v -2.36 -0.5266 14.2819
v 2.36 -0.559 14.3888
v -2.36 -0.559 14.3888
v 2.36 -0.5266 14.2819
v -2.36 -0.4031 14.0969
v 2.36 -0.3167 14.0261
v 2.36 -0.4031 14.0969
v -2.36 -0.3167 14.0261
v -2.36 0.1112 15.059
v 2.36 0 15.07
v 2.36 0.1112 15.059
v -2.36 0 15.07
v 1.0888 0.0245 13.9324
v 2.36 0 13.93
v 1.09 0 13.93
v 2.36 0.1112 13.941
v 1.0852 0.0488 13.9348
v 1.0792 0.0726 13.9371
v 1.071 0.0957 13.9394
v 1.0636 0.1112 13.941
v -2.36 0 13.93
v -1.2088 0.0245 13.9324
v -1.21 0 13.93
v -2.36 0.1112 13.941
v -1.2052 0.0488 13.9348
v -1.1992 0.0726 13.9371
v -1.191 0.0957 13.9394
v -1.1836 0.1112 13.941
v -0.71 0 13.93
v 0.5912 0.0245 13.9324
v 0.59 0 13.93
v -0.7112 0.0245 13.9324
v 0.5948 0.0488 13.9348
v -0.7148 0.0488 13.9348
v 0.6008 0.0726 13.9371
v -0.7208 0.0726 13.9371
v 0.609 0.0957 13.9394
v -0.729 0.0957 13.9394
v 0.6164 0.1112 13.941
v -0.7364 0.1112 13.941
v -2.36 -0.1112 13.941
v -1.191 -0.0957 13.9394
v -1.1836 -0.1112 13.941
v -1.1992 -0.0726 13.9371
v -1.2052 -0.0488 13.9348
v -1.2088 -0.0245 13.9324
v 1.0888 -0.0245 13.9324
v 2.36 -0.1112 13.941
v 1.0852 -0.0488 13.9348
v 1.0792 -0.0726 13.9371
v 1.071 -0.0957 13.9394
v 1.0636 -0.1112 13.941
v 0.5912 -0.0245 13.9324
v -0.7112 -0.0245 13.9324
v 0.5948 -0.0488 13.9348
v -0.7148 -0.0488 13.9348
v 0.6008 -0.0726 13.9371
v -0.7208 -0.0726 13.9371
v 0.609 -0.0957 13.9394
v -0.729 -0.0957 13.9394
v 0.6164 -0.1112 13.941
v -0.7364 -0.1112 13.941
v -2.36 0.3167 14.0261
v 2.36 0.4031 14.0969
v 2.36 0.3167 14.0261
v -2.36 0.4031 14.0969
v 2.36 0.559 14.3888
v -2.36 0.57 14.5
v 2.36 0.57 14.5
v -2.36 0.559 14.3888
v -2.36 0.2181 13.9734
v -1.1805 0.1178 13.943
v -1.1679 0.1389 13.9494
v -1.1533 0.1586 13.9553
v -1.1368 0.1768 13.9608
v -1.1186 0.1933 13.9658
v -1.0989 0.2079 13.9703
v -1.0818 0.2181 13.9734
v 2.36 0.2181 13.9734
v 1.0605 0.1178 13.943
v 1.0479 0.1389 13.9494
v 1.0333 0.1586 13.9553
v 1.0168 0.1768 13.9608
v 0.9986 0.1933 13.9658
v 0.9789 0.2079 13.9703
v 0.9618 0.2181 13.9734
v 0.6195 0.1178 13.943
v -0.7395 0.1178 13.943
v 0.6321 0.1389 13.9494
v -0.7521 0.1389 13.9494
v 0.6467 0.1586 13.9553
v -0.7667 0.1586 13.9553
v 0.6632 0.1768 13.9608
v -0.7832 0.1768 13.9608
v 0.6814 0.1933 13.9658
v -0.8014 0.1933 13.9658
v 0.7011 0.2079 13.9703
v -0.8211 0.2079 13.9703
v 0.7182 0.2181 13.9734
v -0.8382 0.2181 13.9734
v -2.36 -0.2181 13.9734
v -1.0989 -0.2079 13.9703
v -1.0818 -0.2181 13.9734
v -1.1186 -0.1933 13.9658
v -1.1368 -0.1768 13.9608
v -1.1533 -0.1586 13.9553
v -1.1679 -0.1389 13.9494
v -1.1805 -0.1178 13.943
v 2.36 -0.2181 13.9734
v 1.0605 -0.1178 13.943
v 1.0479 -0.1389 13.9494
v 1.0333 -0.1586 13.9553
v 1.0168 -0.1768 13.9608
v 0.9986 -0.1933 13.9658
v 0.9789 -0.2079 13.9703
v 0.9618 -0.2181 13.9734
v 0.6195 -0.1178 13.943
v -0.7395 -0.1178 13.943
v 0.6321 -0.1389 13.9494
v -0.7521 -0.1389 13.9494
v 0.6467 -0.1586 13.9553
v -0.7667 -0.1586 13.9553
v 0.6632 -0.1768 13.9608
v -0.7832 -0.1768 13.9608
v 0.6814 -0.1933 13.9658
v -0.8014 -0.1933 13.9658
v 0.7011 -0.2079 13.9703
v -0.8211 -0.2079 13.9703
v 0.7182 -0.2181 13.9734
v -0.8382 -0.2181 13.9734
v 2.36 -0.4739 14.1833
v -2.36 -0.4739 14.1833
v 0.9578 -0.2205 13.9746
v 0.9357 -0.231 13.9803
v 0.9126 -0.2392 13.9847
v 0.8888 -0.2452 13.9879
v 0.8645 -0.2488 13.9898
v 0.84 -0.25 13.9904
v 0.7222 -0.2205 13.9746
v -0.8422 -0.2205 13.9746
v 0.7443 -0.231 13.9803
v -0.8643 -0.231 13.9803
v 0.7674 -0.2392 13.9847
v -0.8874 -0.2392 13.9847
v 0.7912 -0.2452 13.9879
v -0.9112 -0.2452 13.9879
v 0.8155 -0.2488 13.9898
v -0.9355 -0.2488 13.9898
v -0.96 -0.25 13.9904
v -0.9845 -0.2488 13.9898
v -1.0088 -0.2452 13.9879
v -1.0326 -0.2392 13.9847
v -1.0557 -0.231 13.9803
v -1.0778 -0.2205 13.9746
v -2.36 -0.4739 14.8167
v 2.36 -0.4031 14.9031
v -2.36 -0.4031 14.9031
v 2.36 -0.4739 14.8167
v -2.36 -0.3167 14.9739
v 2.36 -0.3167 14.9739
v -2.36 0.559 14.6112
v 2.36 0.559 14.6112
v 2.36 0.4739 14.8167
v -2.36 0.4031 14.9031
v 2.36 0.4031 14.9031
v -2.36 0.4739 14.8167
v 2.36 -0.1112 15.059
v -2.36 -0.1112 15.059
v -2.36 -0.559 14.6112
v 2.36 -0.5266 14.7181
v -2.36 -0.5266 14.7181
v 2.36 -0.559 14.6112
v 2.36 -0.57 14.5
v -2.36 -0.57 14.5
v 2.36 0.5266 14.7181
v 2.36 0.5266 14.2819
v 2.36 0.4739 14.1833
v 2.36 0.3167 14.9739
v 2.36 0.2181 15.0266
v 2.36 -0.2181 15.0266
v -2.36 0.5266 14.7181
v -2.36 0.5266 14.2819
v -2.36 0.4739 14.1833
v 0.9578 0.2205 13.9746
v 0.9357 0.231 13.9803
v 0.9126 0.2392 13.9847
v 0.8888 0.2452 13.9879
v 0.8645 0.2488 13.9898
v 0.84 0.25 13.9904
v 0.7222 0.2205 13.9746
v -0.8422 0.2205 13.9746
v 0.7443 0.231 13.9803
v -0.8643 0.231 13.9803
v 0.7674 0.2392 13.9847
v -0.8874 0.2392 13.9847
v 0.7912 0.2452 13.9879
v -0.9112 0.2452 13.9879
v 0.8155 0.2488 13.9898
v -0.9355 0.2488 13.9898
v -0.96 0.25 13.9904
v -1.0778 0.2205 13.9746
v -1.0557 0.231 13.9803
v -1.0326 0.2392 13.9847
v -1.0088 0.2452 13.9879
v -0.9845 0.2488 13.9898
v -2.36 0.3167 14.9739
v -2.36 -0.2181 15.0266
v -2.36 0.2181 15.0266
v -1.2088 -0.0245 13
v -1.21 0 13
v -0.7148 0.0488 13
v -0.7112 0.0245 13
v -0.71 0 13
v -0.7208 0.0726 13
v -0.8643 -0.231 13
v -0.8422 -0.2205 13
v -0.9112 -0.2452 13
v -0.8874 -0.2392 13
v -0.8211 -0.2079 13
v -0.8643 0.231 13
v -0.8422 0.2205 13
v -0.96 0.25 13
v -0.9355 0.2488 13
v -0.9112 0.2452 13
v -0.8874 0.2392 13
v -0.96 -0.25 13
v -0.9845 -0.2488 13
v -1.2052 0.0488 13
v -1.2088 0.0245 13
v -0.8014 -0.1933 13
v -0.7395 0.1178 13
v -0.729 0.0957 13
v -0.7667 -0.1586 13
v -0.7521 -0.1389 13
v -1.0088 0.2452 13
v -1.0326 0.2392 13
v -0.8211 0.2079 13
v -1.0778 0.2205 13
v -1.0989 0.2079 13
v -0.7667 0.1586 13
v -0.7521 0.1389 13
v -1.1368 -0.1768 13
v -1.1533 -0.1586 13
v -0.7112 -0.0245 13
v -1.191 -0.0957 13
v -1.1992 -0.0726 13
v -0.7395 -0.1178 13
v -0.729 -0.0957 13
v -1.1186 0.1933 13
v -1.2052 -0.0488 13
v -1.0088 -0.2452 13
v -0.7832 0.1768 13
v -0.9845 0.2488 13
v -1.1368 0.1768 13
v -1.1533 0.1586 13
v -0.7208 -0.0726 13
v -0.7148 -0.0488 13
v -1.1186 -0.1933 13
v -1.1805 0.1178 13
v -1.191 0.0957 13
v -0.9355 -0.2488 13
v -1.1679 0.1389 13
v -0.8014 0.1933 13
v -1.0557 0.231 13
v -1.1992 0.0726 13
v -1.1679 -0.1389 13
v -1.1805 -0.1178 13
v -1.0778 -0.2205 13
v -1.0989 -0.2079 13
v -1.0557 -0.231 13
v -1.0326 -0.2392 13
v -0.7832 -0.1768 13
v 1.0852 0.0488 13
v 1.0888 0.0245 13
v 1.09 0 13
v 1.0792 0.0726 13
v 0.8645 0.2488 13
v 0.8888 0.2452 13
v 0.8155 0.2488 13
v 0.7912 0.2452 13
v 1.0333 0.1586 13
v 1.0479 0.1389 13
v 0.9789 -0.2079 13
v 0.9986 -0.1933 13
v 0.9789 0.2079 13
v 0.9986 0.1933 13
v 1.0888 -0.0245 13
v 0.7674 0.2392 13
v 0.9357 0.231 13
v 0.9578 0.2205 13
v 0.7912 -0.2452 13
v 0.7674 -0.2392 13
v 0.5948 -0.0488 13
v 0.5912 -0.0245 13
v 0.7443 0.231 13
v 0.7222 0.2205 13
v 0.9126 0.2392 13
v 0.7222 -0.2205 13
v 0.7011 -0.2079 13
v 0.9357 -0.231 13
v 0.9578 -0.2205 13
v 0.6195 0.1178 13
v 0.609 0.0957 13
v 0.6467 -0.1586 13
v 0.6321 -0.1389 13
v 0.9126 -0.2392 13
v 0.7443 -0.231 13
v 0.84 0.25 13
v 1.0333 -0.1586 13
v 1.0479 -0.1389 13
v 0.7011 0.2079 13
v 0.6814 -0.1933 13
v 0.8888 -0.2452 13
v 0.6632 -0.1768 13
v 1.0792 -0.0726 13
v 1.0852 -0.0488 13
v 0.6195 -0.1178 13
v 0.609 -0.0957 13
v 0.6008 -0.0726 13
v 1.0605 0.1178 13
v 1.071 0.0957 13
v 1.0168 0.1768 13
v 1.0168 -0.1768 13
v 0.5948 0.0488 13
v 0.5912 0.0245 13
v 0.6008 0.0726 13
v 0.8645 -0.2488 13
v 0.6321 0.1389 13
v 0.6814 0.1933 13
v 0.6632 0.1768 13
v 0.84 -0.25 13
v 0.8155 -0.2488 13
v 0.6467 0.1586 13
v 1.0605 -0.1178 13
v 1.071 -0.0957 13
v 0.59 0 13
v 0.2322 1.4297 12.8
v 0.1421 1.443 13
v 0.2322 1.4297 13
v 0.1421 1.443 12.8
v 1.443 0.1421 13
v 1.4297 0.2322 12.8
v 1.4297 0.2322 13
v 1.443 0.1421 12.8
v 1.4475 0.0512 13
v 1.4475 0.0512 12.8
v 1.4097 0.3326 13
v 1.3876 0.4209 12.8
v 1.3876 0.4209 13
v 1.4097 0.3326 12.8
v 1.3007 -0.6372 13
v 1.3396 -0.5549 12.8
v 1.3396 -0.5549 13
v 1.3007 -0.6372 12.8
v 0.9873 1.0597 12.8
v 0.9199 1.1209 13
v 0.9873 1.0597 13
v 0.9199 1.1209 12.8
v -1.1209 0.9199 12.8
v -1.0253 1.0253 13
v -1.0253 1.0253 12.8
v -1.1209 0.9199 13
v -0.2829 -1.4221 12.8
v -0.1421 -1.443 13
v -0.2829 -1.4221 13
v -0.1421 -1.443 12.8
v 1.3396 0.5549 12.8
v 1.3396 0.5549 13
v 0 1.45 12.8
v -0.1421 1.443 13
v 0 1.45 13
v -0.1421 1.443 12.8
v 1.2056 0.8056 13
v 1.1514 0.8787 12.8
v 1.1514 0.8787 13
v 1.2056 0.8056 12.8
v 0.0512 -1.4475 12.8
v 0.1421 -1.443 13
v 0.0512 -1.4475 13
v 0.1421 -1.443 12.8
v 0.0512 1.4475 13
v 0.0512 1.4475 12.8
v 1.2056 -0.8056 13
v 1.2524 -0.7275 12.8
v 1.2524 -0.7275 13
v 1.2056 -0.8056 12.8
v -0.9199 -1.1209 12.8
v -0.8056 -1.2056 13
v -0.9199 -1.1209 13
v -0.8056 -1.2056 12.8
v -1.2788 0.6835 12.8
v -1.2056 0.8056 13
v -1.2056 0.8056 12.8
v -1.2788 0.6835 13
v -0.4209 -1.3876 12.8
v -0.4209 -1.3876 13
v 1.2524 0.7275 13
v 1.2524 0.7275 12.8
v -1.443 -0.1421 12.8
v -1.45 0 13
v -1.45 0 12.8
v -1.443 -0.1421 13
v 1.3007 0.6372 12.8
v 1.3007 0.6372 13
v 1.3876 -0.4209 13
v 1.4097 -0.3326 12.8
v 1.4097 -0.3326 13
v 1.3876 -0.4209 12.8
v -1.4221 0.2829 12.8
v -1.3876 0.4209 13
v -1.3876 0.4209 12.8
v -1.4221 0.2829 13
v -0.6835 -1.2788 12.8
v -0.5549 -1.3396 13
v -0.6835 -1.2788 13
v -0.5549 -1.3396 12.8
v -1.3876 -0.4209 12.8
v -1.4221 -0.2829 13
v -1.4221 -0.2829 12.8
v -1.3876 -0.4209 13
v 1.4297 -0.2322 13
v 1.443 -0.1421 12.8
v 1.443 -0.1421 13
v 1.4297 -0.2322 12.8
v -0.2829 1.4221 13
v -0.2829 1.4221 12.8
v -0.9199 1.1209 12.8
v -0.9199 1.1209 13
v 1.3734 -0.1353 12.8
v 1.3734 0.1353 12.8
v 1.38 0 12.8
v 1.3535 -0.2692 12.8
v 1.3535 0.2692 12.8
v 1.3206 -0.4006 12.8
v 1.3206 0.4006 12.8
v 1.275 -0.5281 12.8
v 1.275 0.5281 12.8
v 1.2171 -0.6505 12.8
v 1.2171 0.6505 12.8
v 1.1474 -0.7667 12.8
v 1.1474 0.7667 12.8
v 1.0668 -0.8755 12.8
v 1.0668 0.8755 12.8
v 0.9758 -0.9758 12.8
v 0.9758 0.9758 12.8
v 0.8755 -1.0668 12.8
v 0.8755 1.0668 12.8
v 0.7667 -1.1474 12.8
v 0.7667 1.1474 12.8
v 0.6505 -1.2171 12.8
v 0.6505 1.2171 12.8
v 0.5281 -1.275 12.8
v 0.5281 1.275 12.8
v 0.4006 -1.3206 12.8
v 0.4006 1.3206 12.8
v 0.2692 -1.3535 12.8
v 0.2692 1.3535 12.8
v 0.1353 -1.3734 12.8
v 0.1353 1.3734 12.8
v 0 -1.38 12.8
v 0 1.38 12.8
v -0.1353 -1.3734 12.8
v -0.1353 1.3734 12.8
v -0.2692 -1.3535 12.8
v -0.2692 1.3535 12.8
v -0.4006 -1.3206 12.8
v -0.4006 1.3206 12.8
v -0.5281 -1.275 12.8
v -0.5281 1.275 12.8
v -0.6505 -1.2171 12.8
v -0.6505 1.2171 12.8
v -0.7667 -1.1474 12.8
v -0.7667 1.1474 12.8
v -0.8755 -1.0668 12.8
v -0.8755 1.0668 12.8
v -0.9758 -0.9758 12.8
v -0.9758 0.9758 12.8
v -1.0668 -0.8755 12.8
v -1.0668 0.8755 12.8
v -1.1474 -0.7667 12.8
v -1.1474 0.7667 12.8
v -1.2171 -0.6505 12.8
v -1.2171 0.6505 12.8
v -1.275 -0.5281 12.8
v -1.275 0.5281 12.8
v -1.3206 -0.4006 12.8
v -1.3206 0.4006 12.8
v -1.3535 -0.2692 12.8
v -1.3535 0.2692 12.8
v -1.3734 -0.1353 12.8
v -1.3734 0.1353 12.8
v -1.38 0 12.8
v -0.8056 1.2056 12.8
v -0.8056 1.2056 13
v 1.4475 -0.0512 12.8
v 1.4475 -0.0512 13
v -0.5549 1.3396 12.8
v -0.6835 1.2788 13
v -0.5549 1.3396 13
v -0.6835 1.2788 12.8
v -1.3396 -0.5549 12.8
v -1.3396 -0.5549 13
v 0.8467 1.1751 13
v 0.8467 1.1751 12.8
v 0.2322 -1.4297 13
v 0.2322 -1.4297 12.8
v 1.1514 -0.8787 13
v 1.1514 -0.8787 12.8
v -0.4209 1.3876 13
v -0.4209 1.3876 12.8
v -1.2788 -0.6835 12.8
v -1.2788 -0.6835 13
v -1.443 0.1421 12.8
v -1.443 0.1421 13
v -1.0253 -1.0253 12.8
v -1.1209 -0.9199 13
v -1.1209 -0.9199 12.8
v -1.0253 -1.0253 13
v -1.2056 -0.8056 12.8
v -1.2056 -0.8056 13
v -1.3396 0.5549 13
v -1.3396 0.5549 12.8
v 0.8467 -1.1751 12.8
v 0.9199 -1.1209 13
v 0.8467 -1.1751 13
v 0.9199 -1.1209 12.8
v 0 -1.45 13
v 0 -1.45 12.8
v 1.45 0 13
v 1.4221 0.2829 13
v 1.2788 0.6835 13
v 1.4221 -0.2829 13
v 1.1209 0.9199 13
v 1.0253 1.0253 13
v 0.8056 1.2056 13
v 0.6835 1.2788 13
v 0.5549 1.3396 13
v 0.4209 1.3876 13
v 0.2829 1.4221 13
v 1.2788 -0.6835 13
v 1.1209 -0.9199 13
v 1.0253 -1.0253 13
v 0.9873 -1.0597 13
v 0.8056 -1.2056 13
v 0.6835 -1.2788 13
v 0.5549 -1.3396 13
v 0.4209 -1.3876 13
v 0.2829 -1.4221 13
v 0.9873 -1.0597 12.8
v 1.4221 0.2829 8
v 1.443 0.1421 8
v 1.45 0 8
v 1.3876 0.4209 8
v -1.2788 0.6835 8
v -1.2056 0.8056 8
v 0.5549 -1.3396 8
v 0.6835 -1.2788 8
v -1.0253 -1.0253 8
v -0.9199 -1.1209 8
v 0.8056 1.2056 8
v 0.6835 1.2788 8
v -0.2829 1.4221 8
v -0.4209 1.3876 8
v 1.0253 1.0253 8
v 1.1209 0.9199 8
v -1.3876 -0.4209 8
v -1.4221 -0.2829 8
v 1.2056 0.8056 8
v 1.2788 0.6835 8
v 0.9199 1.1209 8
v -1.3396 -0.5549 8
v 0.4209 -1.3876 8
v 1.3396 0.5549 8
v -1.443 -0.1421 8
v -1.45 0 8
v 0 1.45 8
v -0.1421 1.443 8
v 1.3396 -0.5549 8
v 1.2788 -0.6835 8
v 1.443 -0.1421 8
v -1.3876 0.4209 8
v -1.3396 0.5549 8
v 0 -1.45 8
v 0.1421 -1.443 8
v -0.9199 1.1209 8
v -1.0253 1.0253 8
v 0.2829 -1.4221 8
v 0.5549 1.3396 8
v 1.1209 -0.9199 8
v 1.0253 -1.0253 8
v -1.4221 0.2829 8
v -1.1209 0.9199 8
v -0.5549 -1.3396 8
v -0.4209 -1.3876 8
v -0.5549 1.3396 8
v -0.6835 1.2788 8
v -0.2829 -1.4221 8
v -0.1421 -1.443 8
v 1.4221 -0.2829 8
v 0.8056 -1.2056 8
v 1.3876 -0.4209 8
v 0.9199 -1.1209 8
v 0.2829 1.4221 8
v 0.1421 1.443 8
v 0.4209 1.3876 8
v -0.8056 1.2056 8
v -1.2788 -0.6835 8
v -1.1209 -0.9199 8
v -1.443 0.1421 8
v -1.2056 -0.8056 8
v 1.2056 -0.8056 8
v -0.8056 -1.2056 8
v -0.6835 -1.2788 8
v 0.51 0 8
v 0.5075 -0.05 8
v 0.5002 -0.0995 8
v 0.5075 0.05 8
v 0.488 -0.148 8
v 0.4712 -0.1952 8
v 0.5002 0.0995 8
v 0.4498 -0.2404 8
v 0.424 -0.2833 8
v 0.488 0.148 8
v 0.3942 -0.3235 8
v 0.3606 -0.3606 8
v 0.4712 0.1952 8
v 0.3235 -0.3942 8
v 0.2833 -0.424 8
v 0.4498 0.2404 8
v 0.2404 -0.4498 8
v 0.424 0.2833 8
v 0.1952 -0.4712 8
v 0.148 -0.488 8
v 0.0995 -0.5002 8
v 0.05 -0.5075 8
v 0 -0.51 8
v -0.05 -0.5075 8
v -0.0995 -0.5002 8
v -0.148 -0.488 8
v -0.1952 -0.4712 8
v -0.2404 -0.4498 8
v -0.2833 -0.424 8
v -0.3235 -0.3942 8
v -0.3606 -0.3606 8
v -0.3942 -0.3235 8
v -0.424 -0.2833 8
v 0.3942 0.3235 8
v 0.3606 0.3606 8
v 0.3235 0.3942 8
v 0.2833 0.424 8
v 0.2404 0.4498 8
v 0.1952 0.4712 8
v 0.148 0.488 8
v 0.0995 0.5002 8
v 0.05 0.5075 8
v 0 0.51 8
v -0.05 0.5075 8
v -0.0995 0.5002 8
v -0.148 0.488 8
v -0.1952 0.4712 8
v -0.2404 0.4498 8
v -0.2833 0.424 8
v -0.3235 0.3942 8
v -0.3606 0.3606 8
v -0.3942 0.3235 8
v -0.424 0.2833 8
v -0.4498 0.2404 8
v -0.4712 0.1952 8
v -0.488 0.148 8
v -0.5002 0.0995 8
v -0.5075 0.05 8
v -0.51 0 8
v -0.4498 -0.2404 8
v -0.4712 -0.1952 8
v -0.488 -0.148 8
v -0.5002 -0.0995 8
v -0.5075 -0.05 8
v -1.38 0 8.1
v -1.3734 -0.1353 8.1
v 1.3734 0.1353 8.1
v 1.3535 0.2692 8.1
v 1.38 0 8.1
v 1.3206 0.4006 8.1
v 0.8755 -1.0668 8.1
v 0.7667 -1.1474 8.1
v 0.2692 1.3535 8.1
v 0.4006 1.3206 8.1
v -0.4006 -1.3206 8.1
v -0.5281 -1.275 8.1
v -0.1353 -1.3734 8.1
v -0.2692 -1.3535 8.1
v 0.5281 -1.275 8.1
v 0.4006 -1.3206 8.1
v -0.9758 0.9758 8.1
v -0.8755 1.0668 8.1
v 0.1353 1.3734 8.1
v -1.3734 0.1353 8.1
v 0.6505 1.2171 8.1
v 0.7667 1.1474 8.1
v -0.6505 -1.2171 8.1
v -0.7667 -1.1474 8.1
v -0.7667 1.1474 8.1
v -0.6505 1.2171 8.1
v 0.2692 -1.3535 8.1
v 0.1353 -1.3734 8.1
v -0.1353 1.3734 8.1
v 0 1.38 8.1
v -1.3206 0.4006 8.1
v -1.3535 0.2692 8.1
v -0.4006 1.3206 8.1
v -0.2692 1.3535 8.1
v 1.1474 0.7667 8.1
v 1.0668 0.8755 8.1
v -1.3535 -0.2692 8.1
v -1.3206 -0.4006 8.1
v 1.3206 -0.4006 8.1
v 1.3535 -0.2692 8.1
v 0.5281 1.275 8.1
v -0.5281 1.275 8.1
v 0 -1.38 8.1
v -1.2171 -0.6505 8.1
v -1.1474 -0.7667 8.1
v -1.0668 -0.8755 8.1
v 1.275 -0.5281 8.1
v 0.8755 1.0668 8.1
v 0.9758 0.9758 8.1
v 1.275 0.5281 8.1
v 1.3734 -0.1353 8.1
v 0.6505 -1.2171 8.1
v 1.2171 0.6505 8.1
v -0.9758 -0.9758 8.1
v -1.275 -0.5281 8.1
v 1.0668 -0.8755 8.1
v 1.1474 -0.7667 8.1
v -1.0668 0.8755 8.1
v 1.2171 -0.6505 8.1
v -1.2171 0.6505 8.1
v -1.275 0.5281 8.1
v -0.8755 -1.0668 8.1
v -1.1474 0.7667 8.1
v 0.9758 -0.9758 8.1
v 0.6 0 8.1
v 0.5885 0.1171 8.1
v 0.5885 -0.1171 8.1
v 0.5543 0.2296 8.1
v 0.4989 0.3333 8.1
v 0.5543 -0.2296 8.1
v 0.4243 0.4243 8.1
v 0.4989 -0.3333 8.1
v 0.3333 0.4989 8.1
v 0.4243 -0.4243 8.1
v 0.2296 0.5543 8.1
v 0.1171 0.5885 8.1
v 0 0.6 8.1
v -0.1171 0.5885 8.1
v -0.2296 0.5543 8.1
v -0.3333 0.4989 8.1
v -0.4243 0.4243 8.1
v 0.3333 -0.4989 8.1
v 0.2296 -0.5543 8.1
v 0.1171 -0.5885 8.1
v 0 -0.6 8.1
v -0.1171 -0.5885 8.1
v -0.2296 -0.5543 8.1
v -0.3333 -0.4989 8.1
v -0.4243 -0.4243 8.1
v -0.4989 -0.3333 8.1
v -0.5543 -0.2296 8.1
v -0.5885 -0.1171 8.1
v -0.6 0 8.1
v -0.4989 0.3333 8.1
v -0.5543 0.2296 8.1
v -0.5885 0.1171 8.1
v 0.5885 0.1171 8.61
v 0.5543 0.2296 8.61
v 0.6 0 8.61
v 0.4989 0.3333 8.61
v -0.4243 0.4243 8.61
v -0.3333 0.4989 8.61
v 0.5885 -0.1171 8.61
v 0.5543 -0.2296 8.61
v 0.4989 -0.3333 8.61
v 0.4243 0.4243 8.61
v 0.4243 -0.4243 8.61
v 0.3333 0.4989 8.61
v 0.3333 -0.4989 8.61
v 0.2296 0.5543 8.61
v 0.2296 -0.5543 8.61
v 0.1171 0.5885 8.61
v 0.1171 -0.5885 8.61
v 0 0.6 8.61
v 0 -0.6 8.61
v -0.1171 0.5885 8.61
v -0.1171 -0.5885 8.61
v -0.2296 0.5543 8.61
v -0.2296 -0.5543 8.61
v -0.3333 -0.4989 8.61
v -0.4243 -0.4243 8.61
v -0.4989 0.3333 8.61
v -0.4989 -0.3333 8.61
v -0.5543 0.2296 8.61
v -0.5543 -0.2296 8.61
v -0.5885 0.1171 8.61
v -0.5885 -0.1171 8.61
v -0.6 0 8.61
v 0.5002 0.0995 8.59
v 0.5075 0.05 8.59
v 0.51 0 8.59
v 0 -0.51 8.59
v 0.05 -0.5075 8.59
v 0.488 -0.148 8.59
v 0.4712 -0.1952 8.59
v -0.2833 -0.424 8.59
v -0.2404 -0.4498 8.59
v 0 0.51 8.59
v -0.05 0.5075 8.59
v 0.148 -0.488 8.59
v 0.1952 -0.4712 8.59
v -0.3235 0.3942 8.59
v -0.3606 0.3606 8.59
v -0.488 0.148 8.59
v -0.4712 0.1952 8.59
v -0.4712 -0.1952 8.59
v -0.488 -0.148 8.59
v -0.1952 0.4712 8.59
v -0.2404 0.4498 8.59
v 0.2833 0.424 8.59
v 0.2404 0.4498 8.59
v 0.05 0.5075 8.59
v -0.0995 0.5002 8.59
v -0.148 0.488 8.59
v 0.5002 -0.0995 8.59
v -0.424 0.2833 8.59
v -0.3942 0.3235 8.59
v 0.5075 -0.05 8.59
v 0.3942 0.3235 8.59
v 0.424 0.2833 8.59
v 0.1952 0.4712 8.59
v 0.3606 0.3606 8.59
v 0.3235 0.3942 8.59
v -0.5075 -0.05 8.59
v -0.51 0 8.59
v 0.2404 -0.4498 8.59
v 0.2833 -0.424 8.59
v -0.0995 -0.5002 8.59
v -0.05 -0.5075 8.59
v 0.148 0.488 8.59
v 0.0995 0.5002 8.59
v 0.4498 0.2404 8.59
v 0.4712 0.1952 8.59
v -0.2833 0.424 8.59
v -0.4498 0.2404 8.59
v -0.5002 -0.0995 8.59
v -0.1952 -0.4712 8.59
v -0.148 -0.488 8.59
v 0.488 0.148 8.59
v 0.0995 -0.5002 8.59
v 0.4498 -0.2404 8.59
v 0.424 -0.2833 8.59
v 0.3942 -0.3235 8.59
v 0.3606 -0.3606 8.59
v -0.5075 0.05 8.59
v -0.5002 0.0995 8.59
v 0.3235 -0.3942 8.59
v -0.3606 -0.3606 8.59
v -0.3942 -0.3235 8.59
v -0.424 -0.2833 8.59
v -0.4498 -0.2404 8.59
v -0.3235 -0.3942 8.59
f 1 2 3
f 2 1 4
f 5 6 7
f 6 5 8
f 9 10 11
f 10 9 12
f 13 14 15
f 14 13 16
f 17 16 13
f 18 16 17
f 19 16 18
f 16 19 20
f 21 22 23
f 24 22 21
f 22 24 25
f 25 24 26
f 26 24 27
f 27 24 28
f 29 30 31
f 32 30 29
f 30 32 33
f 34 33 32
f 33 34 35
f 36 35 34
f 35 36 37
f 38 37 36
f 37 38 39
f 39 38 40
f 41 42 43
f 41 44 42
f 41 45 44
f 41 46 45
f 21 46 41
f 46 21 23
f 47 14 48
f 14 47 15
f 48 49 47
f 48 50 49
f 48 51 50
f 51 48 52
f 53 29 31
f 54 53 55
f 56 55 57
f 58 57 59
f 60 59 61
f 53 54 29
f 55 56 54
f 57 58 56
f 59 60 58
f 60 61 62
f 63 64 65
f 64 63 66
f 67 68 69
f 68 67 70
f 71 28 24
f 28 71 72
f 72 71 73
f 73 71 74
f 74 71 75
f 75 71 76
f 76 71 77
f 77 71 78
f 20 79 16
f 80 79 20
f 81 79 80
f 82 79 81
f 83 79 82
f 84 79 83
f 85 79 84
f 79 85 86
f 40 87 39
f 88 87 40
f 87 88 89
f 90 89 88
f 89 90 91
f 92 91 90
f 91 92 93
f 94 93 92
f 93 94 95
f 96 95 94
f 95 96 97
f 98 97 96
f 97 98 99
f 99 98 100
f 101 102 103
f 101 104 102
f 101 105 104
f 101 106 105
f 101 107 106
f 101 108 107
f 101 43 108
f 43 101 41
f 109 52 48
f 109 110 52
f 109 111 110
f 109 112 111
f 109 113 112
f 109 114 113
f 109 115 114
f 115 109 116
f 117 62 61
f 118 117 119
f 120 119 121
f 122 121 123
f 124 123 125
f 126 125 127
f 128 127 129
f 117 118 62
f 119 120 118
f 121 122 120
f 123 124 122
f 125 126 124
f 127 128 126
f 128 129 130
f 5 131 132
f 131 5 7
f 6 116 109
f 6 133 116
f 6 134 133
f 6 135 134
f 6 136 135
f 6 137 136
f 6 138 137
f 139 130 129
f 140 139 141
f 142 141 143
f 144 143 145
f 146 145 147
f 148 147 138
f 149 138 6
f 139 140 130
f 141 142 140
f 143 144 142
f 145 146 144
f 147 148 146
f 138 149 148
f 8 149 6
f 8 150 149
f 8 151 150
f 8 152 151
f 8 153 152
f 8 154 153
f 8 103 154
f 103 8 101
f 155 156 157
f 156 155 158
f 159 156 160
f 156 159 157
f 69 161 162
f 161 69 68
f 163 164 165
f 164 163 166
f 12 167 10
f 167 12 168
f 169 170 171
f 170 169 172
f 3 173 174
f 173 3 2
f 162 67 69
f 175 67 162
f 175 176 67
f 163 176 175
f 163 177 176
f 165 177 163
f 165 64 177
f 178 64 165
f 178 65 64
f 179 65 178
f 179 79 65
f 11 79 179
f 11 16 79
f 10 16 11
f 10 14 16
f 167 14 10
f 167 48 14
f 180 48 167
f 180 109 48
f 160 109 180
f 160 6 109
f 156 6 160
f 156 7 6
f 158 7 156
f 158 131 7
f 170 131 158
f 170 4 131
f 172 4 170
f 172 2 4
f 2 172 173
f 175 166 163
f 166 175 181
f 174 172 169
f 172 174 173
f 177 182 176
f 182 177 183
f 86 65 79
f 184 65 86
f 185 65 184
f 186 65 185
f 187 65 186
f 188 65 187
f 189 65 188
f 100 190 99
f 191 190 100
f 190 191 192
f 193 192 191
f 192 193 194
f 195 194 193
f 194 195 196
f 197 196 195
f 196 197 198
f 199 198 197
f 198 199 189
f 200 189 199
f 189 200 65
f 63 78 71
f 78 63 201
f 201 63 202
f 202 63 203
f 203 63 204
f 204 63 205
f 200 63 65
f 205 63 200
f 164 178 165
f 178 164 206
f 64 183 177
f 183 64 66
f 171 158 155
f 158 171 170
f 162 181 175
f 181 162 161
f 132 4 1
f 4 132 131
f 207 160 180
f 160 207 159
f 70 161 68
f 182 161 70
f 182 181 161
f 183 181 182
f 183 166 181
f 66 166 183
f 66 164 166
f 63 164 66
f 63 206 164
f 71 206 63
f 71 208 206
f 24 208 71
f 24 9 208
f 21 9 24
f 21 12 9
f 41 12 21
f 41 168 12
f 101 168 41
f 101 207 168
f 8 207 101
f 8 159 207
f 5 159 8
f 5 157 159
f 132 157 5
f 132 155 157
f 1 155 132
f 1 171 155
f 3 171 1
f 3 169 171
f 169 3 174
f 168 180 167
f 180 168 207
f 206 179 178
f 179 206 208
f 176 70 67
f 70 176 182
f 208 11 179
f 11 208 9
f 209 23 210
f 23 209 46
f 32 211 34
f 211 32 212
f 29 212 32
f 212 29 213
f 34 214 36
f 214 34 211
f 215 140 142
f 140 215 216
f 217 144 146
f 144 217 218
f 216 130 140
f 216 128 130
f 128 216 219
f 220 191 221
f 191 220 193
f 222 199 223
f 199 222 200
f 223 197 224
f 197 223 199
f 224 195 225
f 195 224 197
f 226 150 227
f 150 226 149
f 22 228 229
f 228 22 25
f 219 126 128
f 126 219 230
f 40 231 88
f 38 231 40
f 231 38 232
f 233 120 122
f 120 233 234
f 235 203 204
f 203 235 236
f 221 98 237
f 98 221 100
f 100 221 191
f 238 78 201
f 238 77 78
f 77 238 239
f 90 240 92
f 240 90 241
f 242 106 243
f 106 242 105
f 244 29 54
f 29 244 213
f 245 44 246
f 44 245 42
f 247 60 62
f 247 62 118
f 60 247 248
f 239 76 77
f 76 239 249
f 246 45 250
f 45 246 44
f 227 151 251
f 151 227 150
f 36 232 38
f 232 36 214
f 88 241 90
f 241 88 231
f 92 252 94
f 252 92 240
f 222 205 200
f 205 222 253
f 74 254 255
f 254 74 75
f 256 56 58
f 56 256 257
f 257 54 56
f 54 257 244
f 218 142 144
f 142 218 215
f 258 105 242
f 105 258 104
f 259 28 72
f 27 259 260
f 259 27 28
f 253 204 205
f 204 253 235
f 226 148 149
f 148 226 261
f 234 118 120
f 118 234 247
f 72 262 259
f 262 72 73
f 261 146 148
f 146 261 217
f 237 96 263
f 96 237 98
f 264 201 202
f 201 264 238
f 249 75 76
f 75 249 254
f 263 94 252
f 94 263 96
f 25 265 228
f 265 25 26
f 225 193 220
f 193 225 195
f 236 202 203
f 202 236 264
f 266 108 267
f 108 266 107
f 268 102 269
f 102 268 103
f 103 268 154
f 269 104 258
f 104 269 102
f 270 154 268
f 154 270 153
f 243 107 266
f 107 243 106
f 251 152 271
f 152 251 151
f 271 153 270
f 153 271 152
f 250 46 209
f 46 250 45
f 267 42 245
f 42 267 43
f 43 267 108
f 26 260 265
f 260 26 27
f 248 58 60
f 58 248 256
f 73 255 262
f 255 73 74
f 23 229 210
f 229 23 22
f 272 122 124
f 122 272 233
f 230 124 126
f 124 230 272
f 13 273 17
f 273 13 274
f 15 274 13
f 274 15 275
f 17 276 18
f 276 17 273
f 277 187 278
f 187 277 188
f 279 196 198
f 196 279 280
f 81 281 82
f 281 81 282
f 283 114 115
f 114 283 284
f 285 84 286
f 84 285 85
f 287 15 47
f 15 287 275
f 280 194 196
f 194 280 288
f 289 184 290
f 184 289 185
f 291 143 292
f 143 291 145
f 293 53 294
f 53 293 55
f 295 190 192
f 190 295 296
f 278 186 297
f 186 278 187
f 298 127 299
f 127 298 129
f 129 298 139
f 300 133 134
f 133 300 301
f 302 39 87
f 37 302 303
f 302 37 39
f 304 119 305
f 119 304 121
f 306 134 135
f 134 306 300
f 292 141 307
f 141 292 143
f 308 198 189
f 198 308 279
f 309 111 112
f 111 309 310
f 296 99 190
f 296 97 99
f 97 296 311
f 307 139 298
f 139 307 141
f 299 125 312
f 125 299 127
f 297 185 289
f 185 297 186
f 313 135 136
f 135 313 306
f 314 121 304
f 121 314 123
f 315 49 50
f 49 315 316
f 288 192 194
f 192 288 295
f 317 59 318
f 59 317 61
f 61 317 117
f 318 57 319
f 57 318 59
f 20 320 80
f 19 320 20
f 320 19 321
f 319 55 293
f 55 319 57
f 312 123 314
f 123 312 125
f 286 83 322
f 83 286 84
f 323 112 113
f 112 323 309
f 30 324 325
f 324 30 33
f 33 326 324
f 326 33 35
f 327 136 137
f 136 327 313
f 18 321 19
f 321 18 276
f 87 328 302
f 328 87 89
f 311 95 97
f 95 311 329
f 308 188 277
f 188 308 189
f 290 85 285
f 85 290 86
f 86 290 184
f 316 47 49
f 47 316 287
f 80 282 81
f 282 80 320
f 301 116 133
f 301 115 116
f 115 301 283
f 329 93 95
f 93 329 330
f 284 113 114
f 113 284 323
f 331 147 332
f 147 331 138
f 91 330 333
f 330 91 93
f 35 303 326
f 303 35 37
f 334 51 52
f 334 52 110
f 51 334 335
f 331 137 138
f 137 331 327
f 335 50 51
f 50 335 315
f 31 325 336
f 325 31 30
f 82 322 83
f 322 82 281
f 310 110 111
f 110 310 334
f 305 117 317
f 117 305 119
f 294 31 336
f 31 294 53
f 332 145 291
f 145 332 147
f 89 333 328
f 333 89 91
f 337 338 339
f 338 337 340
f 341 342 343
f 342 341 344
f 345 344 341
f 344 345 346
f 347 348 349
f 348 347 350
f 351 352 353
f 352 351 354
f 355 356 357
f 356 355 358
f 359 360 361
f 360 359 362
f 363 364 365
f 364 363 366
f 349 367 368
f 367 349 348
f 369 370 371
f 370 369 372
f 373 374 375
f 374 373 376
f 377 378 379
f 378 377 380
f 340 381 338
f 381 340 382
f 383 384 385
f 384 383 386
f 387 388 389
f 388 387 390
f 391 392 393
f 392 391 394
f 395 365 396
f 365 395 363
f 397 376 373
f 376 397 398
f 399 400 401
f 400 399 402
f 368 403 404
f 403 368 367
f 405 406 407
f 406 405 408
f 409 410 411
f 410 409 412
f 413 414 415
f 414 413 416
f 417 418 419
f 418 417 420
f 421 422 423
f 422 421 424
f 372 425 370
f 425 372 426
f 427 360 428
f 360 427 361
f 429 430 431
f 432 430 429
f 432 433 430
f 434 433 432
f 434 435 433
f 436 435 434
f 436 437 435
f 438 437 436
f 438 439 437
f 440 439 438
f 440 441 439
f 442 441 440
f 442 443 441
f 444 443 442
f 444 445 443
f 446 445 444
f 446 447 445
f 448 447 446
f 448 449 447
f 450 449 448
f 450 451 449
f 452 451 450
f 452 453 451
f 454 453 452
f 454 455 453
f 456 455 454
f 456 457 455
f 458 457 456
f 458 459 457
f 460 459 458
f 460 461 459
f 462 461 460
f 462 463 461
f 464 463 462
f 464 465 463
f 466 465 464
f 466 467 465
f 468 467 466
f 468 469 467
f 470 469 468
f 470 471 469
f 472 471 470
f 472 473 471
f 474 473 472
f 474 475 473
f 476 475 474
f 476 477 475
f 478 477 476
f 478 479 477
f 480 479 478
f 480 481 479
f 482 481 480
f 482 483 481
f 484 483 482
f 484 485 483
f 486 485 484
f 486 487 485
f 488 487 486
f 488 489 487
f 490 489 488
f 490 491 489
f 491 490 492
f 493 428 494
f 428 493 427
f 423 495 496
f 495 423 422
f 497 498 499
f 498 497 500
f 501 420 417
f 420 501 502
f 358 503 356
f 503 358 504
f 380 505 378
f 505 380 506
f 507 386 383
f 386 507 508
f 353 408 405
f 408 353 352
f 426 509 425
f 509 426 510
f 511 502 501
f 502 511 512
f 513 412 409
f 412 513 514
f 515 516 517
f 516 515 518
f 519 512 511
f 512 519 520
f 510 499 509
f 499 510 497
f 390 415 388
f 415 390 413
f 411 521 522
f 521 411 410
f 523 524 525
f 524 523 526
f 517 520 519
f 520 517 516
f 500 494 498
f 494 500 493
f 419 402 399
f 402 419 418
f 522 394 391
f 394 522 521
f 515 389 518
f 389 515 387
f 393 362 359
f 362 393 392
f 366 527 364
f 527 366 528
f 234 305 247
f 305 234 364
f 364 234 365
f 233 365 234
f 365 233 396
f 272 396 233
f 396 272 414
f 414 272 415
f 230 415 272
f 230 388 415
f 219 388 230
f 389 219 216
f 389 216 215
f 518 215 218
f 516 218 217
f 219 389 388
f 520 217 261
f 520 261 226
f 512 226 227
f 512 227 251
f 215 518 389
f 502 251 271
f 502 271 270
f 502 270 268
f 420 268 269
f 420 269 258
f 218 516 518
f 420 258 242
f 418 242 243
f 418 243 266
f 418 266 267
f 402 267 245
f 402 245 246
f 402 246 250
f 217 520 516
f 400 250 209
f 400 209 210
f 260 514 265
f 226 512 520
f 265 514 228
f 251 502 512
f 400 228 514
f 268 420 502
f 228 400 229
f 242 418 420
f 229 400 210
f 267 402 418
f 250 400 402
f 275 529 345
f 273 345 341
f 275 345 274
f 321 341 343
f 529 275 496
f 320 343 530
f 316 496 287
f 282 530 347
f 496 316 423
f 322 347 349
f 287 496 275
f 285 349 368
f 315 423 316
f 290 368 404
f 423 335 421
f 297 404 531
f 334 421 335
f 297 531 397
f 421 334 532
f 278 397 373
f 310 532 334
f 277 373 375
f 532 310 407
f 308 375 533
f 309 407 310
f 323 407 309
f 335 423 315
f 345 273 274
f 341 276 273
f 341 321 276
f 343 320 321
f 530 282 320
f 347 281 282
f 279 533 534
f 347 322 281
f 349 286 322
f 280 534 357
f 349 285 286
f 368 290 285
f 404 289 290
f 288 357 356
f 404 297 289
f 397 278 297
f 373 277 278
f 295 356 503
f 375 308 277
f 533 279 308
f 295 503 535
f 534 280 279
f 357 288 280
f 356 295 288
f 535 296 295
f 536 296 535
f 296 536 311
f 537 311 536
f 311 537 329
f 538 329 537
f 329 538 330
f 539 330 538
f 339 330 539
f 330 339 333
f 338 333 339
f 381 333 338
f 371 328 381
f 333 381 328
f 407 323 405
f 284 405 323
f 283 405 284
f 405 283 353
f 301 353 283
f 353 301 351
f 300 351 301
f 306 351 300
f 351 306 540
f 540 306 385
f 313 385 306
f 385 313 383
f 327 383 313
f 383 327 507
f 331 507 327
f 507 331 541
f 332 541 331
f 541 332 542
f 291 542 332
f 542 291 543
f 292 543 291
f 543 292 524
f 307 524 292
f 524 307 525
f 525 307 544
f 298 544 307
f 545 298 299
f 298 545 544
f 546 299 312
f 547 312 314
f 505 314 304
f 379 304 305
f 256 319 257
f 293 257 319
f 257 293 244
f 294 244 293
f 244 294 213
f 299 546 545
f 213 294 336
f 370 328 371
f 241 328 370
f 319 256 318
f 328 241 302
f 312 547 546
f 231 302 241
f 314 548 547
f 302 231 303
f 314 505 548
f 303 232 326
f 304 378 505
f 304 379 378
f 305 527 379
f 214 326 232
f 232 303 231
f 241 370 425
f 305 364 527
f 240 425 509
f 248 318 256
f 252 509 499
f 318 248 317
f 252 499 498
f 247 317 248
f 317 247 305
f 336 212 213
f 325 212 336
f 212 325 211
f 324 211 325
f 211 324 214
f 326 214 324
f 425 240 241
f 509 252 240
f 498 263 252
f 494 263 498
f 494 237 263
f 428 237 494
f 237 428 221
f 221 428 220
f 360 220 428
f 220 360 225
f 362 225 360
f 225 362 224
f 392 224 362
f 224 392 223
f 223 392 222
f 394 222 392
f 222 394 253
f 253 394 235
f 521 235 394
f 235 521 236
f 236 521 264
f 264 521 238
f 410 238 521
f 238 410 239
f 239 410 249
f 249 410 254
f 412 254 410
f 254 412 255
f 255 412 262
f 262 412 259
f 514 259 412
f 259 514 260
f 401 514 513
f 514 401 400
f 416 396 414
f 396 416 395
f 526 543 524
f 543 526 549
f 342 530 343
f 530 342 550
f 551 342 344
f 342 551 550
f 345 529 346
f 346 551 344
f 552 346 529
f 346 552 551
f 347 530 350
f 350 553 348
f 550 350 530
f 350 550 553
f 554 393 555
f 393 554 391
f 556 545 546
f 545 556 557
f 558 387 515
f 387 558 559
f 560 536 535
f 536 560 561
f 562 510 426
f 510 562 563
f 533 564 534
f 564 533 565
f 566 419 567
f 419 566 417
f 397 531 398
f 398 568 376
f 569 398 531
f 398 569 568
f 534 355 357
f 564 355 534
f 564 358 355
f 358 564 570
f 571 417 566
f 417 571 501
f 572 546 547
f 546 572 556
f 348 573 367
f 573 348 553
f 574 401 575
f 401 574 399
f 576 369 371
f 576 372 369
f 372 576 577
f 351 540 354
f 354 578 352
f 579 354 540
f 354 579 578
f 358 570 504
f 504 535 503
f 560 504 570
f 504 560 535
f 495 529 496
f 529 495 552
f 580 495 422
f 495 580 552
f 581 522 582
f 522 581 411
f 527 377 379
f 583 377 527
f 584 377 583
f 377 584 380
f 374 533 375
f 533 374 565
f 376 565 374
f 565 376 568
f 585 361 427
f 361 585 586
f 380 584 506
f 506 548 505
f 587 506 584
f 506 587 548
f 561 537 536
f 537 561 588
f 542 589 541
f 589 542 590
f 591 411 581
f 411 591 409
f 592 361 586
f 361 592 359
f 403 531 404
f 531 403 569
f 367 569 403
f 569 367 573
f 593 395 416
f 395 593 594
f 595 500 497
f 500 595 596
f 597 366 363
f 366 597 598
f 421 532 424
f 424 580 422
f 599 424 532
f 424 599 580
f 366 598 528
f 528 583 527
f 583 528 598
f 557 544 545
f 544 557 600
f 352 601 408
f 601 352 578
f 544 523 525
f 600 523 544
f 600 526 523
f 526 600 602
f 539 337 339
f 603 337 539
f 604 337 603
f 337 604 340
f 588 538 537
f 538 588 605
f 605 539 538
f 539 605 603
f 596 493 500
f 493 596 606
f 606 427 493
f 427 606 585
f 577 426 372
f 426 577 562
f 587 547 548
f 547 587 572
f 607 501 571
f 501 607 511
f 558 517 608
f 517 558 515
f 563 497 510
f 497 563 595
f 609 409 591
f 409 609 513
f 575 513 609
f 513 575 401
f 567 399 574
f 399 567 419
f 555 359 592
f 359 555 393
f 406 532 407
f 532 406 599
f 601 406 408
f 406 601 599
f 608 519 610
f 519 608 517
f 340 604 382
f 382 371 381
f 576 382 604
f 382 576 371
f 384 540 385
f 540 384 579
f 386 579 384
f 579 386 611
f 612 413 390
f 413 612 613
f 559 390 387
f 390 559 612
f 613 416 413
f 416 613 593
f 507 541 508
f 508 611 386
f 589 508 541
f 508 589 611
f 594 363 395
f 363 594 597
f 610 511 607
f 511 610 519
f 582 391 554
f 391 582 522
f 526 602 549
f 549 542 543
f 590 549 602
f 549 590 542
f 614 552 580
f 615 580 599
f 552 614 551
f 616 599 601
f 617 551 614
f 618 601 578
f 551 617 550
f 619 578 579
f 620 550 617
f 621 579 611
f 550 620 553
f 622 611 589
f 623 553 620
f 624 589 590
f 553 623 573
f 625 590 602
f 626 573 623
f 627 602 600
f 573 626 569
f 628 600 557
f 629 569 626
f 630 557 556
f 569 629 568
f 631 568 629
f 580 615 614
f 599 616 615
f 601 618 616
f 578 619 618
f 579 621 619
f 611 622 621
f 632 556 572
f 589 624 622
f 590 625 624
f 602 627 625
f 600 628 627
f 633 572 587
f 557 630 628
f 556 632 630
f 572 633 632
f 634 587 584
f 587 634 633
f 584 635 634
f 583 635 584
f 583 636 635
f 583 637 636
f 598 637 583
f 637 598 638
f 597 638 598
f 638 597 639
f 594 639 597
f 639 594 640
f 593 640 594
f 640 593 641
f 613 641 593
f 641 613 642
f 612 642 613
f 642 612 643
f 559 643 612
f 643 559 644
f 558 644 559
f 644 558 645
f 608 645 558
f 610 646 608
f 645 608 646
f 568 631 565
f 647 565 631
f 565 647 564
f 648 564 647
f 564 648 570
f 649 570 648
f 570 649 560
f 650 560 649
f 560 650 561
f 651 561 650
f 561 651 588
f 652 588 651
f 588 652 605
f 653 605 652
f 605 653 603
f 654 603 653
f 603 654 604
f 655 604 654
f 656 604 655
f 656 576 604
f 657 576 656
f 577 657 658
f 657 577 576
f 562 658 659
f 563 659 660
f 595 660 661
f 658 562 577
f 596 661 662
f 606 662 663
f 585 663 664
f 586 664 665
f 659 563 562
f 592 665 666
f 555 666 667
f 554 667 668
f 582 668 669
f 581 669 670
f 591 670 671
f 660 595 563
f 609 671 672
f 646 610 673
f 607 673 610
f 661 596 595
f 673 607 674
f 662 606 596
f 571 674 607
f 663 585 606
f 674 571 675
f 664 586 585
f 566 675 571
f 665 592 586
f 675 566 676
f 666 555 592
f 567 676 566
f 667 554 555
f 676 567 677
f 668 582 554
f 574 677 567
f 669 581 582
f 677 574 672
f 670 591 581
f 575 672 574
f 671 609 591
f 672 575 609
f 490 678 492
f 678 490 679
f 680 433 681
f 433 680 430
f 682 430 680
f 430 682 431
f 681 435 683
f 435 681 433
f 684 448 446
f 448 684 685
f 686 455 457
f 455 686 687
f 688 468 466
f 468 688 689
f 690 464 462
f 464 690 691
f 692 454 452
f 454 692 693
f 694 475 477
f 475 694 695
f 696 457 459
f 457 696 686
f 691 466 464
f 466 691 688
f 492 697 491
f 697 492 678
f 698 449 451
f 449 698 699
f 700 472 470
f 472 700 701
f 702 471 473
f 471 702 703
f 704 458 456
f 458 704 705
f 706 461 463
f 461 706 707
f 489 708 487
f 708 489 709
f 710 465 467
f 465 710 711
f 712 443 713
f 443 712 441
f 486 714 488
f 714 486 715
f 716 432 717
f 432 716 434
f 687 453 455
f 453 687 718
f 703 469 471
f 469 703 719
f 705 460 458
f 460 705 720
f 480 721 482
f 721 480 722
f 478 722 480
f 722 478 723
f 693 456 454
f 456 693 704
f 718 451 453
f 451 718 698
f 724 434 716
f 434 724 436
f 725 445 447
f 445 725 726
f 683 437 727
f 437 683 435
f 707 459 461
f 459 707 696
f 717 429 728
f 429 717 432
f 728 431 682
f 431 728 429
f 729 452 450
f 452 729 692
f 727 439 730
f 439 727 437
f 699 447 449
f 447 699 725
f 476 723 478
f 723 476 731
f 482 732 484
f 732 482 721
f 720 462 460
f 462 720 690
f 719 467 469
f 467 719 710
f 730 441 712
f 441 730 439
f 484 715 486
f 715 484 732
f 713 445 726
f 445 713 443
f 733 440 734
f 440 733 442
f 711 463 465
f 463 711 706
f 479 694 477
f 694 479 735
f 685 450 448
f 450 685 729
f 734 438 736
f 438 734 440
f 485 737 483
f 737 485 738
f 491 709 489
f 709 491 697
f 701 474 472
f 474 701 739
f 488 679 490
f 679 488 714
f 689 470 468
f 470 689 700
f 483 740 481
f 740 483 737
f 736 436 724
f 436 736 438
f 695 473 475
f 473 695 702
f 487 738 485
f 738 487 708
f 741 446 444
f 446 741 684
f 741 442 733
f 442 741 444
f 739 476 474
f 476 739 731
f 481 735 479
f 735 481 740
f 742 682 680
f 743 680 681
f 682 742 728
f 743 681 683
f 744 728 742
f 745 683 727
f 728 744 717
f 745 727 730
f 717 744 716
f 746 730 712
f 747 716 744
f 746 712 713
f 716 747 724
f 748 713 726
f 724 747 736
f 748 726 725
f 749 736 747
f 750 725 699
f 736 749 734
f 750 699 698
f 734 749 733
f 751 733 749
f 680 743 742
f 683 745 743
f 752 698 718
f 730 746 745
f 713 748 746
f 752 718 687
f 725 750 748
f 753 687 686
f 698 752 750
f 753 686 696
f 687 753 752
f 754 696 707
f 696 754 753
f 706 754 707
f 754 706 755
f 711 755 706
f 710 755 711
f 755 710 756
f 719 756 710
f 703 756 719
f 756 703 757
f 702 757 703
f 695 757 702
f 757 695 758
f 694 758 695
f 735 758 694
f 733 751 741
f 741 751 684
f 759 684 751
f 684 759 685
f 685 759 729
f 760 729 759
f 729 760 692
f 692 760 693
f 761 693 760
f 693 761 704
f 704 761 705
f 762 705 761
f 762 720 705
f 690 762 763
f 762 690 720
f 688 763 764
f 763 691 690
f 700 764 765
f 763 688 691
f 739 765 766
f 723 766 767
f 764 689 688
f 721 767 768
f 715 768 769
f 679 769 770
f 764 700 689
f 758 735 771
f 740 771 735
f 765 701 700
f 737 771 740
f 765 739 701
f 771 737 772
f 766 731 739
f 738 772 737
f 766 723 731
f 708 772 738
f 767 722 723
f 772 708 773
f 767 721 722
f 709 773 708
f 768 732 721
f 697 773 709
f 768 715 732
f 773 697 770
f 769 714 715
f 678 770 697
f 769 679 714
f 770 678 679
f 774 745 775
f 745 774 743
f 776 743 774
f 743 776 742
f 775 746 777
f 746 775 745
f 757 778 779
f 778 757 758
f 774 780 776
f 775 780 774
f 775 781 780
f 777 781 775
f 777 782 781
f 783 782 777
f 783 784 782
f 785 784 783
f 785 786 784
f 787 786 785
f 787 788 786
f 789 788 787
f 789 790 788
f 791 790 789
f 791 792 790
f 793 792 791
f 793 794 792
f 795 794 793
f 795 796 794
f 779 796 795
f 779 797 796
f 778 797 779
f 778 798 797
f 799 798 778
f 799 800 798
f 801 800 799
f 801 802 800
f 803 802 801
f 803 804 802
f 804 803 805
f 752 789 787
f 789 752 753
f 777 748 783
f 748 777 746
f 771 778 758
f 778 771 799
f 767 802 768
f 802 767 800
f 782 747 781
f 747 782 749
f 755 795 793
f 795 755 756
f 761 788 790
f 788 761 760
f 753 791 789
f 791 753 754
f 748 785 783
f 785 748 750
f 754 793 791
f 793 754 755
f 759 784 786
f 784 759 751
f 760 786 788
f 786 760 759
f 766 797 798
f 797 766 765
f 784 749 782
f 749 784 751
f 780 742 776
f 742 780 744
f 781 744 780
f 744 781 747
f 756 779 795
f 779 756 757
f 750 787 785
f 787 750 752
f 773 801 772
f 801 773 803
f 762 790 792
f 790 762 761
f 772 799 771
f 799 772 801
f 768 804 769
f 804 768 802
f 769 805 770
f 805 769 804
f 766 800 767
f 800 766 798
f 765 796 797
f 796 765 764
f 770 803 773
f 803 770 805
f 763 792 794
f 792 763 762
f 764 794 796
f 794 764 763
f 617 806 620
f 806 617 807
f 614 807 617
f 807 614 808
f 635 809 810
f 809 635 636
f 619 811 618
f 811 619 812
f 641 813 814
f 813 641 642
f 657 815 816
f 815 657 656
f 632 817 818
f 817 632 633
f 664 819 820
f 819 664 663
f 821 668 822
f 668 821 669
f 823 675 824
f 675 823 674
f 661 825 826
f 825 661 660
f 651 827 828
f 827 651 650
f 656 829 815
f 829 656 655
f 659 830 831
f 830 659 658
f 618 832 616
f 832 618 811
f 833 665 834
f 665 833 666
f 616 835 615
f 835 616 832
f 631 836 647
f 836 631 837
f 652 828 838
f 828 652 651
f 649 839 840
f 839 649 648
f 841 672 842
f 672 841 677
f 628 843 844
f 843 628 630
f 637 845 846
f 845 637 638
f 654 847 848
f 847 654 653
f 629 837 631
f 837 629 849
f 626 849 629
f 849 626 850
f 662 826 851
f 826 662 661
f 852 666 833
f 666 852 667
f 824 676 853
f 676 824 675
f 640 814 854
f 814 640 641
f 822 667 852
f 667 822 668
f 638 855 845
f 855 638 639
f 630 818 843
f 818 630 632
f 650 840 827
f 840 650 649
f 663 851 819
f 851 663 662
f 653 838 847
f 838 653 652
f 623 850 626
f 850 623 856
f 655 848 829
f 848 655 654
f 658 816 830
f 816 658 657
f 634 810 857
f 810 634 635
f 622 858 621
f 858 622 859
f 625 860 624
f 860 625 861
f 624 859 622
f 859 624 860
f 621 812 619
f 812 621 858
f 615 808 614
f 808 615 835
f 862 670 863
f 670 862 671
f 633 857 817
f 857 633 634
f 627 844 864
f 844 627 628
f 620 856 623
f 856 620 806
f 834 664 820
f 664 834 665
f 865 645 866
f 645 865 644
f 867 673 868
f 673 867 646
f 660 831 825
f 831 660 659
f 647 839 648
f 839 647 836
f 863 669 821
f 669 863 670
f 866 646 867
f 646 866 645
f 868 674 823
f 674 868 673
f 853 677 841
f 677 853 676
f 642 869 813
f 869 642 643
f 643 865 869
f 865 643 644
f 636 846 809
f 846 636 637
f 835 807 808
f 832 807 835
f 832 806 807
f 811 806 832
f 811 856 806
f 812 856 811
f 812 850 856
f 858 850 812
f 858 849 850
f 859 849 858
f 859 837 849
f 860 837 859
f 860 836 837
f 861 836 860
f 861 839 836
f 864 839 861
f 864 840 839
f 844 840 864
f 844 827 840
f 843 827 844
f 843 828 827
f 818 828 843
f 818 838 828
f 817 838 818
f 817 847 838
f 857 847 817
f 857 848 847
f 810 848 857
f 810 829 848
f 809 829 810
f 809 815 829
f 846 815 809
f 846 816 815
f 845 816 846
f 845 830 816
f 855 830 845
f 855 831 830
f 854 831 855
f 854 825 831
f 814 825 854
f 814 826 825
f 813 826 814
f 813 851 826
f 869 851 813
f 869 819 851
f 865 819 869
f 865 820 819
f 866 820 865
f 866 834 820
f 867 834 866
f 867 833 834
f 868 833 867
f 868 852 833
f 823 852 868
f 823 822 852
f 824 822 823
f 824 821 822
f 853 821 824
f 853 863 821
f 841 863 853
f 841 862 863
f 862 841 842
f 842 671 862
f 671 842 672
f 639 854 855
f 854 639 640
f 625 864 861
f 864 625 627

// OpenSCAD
//Upper section/Piston

//color("DarkMagenta")
//handle for squeezing (2.9cm radius  gripping)
union(){
union(){
translate([-2.36,0,14.5]){
union(){
rotate([0,90,0]){
    cylinder(h = 4.72, r = 0.57, $fn=32);
}
translate([1.4,0,-1.6]){
cylinder(h = 1.2, r = 0.25, $fn=64);        
}
translate([3.2,0,-1.6]){
cylinder(h = 1.2, r = 0.25, $fn=64);        
}
}

//cylinder top cover
translate([2.36,0,-1.7]){
 //   union(){
cylinder(h = 0.2, r = 1.45, $fn=64);
}
}
}

color("MediumSlateBlue")
  //outer case of the piston
translate([0,0,8]){
//hole that mate with the cushion supporter
difference(){
    //knode inside the piston  
    union(){
    translate([0,0,0.01]){
          cylinder(h=0.6, r=0.6, $fn=32);
      }
  difference(){
          cylinder(h = 5, r = 1.45, $fn=64);          
      //inner piston wall, cylinder shape
      translate([0,0,0.1]){
      cylinder(h = 5, r = 1.38, $fn=64);
      }
}
}
  translate([0,0,-0.01]){
          cylinder(h=0.6, r=0.51, $fn=64);
      }
  }
  }
  }
